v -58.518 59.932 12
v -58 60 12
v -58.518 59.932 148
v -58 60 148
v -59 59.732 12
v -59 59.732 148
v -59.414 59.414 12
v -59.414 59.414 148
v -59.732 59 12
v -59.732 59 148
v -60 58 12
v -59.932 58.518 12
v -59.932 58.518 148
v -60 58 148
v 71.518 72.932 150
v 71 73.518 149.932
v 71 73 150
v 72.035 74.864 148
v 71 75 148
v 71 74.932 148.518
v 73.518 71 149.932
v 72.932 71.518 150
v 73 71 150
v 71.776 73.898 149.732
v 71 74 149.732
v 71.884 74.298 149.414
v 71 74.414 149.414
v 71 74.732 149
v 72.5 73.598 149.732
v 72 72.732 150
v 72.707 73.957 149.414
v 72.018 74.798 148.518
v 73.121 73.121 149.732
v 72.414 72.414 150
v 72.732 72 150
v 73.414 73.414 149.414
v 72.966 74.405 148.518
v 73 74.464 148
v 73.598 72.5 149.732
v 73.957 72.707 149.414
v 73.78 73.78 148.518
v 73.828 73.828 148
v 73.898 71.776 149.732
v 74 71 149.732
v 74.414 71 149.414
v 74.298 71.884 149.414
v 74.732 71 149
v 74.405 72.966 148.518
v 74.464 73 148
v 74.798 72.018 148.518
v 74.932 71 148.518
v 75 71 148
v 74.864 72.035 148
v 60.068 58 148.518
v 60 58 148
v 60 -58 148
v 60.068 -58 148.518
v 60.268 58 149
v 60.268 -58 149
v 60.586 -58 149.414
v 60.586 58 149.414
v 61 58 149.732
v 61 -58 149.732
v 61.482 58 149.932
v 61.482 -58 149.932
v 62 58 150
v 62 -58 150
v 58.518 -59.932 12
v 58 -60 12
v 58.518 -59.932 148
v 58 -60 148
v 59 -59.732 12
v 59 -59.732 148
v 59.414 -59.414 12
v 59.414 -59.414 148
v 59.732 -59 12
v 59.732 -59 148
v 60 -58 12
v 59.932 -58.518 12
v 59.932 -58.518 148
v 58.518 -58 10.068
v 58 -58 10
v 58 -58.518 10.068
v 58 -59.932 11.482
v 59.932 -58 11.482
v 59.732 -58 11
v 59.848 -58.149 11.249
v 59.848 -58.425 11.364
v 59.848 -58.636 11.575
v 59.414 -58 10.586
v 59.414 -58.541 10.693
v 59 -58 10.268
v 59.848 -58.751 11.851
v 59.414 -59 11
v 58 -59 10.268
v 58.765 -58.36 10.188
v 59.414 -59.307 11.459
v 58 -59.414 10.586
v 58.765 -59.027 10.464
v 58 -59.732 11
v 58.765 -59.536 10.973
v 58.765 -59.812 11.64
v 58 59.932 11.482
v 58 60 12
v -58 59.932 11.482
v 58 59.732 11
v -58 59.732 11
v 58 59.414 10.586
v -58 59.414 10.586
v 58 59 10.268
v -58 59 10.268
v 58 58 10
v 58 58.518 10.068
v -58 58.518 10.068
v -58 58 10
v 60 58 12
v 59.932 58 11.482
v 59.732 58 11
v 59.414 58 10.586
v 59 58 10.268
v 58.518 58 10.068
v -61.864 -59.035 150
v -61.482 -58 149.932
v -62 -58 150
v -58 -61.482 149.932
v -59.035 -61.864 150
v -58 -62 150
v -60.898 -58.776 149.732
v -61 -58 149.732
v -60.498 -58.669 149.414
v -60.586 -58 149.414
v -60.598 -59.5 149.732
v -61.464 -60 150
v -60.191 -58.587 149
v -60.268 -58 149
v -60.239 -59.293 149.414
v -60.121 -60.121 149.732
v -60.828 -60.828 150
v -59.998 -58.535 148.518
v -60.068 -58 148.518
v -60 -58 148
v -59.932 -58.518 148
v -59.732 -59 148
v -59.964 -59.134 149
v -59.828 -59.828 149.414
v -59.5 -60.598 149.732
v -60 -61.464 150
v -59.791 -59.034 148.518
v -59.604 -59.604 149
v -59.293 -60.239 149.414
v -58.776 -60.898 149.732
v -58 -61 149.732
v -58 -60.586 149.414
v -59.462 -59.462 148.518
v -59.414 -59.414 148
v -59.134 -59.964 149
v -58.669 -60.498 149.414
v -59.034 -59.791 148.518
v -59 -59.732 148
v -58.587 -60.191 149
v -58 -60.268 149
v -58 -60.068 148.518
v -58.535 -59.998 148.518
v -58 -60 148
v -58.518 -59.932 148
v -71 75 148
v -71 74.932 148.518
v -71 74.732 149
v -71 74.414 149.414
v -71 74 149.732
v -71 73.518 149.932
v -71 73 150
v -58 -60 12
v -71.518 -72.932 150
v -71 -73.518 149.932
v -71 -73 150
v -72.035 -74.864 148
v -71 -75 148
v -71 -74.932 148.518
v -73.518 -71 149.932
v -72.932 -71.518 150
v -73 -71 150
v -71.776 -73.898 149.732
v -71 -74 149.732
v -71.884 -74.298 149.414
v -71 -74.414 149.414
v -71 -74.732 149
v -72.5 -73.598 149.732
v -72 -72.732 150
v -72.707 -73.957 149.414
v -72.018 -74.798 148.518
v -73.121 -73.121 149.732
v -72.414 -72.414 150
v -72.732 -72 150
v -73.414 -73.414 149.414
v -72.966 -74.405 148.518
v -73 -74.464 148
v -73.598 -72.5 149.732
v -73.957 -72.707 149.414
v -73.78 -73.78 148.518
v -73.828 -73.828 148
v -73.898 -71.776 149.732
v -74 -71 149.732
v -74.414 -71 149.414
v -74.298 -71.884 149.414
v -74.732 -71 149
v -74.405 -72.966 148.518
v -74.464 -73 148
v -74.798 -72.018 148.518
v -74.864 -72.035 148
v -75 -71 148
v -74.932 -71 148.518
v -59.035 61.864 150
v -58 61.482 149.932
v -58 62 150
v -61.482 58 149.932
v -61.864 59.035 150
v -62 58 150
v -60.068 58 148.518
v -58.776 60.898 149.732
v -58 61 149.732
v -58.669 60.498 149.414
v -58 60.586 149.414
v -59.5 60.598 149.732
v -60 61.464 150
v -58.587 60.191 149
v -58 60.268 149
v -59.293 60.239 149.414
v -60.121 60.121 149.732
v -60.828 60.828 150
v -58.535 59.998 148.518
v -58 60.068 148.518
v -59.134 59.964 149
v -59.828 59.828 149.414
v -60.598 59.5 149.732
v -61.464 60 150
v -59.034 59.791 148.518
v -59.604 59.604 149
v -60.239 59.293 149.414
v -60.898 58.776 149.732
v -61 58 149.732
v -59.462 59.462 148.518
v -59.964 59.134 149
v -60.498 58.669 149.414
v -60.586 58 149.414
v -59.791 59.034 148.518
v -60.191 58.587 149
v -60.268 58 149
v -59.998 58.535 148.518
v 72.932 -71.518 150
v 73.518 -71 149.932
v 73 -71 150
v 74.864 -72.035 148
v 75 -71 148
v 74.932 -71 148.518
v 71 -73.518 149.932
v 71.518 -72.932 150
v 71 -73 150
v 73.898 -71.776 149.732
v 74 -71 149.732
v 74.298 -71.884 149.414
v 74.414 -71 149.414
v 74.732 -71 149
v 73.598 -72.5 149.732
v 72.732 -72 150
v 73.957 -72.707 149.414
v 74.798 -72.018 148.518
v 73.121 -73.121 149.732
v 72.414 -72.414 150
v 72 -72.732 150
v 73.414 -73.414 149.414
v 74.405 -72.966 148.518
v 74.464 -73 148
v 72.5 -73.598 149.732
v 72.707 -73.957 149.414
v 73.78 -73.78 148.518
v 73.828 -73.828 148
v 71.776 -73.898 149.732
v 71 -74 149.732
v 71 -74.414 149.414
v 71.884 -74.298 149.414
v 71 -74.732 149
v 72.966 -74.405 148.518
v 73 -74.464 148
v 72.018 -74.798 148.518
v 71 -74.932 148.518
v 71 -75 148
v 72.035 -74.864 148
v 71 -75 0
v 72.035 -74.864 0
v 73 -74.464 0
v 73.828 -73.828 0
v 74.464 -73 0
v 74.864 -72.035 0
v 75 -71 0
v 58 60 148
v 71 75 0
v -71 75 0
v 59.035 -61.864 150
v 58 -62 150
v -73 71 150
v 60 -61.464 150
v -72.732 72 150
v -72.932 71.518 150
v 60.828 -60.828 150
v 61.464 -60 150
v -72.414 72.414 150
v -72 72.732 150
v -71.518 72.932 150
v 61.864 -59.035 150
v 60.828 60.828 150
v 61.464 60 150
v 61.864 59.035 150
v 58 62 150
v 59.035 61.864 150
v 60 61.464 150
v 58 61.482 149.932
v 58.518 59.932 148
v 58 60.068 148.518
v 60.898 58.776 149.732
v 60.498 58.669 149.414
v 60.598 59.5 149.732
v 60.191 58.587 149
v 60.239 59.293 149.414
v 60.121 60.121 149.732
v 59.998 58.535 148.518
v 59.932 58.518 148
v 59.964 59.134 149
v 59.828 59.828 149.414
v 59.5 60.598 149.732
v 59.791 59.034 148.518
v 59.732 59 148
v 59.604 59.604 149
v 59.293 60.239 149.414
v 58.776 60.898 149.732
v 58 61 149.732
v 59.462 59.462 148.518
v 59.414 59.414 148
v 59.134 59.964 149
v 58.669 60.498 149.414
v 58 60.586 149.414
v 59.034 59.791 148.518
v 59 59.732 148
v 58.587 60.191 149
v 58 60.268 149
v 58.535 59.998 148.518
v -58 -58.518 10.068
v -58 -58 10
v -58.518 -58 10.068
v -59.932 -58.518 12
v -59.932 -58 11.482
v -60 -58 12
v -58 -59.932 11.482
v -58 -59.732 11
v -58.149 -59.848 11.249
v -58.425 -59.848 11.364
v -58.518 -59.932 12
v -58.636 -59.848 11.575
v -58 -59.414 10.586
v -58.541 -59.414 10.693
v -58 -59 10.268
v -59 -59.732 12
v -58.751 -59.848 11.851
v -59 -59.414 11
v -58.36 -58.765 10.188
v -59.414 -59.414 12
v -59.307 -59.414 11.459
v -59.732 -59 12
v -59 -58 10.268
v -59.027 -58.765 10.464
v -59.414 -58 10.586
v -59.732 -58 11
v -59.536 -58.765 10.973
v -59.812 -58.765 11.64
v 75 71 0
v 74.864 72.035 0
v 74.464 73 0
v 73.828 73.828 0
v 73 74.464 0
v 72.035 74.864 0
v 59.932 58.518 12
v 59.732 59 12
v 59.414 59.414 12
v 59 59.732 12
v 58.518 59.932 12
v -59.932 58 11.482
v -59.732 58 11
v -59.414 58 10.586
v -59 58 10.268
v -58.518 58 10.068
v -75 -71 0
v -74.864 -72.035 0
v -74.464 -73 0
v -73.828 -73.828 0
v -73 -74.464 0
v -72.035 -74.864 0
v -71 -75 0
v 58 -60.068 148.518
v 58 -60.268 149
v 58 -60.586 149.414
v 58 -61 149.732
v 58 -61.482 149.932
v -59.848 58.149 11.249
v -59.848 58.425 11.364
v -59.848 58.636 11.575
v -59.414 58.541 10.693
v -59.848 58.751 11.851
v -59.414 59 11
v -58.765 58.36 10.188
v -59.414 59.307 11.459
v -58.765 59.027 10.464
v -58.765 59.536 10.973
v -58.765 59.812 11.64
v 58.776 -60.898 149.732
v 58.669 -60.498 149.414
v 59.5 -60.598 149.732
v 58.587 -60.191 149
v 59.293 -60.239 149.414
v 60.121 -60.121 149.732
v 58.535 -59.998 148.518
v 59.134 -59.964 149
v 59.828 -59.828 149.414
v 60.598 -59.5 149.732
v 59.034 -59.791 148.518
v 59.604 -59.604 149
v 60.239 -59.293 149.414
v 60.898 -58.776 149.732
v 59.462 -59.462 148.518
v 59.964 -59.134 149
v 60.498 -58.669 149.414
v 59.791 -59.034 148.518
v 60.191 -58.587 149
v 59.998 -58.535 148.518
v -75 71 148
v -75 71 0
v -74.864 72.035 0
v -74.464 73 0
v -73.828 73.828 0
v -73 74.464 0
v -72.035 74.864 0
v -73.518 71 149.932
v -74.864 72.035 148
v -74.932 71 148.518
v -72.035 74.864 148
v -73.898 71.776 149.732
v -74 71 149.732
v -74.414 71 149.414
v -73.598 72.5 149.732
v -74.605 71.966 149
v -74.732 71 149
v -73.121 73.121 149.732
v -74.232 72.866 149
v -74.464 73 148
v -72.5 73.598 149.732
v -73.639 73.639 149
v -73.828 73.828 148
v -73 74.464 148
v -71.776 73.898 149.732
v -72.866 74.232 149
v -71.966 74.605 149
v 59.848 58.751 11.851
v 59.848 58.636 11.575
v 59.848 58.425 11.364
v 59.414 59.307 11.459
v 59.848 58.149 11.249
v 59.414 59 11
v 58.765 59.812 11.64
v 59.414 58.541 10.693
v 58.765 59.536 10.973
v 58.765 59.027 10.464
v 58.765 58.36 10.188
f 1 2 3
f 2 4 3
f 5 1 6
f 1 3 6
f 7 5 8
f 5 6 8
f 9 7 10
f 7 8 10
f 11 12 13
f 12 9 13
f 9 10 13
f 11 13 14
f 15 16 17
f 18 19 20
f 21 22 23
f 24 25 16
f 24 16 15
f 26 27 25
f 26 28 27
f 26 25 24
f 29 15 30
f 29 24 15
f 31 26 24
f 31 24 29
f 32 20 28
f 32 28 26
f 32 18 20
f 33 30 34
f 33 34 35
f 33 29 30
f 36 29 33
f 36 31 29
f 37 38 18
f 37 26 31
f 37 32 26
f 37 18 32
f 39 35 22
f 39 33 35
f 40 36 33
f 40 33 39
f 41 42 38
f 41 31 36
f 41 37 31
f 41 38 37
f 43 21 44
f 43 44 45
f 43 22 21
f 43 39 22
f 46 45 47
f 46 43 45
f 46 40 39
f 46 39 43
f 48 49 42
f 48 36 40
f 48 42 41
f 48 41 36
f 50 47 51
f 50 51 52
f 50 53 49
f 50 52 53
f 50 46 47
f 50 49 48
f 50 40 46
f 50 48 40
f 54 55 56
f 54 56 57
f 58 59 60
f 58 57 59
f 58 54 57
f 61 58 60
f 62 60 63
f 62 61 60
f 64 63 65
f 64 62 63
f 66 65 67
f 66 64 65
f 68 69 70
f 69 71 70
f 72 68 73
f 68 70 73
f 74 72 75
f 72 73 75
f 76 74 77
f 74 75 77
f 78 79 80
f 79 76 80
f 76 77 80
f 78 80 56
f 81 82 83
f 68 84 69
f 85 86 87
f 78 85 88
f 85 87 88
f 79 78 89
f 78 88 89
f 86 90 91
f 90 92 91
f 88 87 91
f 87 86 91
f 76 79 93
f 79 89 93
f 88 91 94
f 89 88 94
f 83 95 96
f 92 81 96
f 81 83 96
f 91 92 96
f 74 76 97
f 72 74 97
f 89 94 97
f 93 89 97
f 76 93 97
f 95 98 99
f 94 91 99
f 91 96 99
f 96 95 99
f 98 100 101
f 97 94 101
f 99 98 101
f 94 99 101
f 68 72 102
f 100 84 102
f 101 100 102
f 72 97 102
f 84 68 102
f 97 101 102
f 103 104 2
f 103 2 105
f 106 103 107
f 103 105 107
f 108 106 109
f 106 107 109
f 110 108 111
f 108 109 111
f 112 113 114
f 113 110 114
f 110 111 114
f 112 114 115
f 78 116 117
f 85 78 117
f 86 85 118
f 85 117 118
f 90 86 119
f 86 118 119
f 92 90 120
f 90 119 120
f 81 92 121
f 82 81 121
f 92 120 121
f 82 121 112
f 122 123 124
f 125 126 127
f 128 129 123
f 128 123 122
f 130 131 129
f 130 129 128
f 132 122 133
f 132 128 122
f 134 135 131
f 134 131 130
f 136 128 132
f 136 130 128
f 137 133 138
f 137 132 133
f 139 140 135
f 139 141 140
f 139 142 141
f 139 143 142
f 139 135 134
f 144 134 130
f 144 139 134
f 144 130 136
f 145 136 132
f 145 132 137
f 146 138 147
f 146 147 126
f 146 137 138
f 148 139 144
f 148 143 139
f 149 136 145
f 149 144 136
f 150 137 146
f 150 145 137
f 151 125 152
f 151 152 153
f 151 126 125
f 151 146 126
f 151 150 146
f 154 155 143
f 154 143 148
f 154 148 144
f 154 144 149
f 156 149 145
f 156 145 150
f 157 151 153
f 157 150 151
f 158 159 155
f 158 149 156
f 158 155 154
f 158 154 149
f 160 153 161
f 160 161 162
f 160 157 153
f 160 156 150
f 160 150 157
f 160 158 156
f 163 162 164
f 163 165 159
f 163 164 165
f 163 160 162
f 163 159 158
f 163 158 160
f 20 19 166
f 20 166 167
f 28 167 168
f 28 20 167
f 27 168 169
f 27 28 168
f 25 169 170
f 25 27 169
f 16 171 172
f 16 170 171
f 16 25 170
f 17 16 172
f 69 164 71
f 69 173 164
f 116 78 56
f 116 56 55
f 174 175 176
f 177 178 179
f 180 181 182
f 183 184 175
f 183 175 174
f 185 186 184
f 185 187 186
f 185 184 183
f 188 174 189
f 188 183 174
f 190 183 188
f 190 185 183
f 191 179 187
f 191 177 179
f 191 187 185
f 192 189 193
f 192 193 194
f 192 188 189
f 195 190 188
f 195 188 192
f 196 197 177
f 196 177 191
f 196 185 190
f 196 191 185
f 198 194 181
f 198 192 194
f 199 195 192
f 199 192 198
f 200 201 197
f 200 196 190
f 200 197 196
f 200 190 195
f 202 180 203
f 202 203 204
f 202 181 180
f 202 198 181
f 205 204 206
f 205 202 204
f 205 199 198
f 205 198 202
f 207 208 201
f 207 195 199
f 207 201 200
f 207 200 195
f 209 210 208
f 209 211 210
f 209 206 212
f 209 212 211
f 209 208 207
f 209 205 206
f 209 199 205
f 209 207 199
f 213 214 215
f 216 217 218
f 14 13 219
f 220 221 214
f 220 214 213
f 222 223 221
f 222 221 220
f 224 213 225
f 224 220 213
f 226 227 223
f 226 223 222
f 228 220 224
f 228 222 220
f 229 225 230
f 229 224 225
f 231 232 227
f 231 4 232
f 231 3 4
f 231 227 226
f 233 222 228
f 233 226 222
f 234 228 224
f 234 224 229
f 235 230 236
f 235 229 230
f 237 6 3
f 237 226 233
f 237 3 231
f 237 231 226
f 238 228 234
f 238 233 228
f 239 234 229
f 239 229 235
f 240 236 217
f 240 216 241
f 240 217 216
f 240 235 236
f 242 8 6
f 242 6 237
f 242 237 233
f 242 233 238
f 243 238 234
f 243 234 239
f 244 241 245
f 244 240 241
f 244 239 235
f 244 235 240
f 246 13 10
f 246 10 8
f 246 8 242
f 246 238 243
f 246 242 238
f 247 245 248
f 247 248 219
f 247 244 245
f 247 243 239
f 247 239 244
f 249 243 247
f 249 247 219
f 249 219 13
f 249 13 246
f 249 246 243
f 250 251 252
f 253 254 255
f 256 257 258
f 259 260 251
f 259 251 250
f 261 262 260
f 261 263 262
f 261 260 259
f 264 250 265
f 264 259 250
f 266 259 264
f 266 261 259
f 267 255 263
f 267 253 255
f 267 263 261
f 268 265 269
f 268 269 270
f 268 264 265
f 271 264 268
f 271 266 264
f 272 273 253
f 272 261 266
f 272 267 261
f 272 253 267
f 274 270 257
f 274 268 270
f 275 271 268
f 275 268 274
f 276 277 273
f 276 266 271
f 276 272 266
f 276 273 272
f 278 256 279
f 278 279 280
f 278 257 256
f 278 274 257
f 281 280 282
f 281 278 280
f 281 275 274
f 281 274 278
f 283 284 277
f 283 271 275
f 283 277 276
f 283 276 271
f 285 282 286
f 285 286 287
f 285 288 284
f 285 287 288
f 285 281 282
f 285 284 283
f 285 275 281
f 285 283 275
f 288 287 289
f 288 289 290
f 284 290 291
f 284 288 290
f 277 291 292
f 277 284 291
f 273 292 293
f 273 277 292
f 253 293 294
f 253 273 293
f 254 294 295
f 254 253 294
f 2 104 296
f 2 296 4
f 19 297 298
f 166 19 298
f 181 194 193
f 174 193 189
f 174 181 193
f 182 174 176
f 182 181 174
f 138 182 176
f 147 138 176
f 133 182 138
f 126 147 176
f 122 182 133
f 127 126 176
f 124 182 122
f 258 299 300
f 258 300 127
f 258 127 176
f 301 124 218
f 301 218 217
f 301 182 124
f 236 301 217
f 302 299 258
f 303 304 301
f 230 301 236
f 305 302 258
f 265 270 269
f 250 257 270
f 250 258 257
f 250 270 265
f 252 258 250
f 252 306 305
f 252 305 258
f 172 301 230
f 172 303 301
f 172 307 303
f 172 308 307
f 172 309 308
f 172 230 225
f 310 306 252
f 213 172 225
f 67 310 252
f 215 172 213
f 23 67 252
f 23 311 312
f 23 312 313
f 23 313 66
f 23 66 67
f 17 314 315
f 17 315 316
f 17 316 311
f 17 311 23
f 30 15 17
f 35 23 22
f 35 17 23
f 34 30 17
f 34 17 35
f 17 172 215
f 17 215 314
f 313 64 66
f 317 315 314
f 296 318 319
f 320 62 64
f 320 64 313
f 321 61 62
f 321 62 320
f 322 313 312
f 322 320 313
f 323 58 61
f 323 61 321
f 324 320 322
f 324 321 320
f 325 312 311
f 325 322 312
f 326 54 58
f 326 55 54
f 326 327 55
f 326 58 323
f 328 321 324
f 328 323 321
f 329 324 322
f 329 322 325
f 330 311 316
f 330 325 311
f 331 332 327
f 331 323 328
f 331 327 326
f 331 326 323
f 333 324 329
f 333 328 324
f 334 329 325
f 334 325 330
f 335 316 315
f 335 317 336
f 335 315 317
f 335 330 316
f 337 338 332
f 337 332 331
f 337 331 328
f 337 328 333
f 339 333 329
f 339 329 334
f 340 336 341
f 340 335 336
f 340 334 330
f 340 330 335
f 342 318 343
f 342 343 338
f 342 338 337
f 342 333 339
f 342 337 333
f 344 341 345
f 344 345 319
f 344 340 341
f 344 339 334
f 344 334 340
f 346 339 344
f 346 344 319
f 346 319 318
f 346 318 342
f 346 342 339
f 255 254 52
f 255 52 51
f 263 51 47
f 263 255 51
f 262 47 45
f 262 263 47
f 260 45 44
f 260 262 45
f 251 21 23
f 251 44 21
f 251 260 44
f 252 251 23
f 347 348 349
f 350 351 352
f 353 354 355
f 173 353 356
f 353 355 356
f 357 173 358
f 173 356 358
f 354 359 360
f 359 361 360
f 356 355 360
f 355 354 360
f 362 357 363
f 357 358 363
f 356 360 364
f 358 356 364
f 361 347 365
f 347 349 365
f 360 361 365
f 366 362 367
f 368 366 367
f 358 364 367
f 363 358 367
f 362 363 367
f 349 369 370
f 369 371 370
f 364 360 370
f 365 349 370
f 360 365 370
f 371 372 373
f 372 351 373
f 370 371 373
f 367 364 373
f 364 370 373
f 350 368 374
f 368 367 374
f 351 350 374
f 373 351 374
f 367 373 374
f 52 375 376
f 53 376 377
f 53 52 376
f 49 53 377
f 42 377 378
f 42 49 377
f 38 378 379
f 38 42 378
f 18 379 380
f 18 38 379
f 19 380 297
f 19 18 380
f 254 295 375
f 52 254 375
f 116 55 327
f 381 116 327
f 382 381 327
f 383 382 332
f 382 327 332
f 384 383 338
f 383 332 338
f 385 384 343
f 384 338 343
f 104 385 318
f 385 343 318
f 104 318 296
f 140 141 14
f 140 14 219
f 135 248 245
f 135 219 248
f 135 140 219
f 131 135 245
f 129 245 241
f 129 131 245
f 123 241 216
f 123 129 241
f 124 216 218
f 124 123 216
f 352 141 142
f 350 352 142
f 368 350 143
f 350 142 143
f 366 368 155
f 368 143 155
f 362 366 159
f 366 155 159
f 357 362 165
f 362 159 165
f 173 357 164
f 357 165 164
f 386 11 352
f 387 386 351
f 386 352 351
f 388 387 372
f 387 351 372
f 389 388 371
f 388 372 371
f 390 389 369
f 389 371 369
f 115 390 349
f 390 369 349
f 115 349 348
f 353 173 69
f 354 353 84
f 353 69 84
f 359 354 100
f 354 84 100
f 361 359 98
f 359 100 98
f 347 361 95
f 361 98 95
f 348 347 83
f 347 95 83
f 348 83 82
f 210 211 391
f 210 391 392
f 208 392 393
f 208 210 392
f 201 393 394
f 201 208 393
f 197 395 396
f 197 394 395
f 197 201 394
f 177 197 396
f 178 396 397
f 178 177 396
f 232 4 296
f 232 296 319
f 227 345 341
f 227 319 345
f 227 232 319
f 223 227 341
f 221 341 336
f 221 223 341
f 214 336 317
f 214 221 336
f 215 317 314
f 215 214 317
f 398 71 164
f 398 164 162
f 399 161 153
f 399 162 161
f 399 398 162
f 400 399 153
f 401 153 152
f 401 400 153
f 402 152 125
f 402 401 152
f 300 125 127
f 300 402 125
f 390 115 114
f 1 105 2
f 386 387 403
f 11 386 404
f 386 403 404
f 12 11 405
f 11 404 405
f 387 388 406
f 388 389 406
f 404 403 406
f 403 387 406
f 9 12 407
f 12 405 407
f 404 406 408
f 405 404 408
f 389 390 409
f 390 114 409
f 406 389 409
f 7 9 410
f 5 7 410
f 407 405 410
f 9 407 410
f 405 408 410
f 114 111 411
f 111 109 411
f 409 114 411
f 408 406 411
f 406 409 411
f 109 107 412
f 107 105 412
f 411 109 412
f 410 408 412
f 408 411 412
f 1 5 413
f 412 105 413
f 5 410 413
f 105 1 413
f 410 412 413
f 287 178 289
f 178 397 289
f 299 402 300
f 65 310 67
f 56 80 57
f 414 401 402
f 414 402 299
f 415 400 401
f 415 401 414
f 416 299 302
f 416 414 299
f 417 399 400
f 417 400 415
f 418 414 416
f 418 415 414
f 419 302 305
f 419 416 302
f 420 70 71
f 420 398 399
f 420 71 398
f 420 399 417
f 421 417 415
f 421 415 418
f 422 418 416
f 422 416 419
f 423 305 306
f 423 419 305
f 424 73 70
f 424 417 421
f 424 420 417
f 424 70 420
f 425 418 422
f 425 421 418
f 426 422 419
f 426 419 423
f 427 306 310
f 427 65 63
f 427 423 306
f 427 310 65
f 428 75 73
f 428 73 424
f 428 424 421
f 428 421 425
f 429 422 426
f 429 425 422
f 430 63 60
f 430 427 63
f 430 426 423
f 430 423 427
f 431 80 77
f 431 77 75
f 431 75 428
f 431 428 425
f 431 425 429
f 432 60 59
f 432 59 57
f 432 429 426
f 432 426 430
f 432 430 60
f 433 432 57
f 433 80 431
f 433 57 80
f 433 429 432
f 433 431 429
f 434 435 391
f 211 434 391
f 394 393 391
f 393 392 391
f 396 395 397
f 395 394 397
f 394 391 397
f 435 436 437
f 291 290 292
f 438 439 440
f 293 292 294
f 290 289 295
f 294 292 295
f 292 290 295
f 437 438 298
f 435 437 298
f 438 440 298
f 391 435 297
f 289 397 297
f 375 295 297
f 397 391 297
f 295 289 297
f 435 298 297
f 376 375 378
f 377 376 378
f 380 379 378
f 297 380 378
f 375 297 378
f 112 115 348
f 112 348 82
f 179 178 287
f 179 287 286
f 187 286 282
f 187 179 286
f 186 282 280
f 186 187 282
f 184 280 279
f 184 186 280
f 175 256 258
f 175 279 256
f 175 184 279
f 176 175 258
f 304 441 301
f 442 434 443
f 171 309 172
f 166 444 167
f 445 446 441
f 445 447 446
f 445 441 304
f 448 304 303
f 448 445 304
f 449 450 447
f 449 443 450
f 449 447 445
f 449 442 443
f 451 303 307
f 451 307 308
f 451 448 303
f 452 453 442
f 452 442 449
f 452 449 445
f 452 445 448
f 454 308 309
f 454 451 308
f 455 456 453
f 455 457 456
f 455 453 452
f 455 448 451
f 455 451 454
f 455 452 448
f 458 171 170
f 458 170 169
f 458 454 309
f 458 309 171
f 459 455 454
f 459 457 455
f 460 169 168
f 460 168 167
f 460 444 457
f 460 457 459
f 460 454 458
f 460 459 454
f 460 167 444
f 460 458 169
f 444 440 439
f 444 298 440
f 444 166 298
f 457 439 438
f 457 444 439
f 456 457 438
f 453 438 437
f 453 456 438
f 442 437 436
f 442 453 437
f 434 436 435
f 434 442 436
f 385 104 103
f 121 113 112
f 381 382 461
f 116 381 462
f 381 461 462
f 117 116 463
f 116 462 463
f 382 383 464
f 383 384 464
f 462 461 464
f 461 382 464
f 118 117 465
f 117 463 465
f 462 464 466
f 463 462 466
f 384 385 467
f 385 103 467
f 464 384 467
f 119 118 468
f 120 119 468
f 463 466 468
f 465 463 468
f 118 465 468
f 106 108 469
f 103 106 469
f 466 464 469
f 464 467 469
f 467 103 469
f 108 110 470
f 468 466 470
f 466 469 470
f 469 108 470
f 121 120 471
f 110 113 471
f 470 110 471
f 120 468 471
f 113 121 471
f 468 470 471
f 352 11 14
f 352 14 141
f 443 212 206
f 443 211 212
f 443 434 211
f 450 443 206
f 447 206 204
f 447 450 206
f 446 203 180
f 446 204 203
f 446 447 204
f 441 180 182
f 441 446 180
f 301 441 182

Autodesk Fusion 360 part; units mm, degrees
sketch "Sketch1" plane through (0, 0, 0) normal (0, 0, 1) x (1, 0, 0)
  line L0 (75, 75) -> (-75, 75)
  line L1 (-75, 75) -> (-75, -75)
  line L2 (-75, -75) -> (75, -75)
  line L3 (75, -75) -> (75, 75)
  line L4 (75, 75) -> (-75, -75) construction
  line L5 (-75, 75) -> (75, -75) construction
  line L6 (60, 60) -> (-60, 60)
  line L7 (-60, 60) -> (-60, -60)
  line L8 (-60, -60) -> (60, -60)
  line L9 (60, -60) -> (60, 60)
  line L10 (60, 60) -> (-60, -60) construction
  line L11 (-60, 60) -> (60, -60) construction
  dimension "d1" = 150
  dimension "d2" = 150
  dimension "d3" = 120
  dimension "d4" = 120
extrude "Extrude1" add sketch "Sketch1" along normal blind 10 contours L6 L7 L8 L9
extrude "Extrude2" add sketch "Sketch1" along normal blind 150
fillet "Fillet1" radius 2 12 edges at (-60, 0, 150) (0, 60, 150) (60, 0, 150) (0, -60, 150) (0, 60, 10) (-60, 0, 10) (-60, 60, 80) (0, -60, 10) (-60, -60, 80) (60, -60, 80) (60, 0, 10) (60, 60, 80)
fillet "Fillet2" radius 4 4 edges at (75, -75, 75) (-75, -75, 75) (75, 75, 75) (-75, 75, 75)
fillet "Fillet3" radius 2 8 edges at (-73.8284, 73.8284, 150) (-75, 0, 150) (-73.8284, -73.8284, 150) (0, -75, 150) (73.8284, -73.8284, 150) (75, 0, 150) (73.8284, 73.8284, 150) (0, 75, 150)
